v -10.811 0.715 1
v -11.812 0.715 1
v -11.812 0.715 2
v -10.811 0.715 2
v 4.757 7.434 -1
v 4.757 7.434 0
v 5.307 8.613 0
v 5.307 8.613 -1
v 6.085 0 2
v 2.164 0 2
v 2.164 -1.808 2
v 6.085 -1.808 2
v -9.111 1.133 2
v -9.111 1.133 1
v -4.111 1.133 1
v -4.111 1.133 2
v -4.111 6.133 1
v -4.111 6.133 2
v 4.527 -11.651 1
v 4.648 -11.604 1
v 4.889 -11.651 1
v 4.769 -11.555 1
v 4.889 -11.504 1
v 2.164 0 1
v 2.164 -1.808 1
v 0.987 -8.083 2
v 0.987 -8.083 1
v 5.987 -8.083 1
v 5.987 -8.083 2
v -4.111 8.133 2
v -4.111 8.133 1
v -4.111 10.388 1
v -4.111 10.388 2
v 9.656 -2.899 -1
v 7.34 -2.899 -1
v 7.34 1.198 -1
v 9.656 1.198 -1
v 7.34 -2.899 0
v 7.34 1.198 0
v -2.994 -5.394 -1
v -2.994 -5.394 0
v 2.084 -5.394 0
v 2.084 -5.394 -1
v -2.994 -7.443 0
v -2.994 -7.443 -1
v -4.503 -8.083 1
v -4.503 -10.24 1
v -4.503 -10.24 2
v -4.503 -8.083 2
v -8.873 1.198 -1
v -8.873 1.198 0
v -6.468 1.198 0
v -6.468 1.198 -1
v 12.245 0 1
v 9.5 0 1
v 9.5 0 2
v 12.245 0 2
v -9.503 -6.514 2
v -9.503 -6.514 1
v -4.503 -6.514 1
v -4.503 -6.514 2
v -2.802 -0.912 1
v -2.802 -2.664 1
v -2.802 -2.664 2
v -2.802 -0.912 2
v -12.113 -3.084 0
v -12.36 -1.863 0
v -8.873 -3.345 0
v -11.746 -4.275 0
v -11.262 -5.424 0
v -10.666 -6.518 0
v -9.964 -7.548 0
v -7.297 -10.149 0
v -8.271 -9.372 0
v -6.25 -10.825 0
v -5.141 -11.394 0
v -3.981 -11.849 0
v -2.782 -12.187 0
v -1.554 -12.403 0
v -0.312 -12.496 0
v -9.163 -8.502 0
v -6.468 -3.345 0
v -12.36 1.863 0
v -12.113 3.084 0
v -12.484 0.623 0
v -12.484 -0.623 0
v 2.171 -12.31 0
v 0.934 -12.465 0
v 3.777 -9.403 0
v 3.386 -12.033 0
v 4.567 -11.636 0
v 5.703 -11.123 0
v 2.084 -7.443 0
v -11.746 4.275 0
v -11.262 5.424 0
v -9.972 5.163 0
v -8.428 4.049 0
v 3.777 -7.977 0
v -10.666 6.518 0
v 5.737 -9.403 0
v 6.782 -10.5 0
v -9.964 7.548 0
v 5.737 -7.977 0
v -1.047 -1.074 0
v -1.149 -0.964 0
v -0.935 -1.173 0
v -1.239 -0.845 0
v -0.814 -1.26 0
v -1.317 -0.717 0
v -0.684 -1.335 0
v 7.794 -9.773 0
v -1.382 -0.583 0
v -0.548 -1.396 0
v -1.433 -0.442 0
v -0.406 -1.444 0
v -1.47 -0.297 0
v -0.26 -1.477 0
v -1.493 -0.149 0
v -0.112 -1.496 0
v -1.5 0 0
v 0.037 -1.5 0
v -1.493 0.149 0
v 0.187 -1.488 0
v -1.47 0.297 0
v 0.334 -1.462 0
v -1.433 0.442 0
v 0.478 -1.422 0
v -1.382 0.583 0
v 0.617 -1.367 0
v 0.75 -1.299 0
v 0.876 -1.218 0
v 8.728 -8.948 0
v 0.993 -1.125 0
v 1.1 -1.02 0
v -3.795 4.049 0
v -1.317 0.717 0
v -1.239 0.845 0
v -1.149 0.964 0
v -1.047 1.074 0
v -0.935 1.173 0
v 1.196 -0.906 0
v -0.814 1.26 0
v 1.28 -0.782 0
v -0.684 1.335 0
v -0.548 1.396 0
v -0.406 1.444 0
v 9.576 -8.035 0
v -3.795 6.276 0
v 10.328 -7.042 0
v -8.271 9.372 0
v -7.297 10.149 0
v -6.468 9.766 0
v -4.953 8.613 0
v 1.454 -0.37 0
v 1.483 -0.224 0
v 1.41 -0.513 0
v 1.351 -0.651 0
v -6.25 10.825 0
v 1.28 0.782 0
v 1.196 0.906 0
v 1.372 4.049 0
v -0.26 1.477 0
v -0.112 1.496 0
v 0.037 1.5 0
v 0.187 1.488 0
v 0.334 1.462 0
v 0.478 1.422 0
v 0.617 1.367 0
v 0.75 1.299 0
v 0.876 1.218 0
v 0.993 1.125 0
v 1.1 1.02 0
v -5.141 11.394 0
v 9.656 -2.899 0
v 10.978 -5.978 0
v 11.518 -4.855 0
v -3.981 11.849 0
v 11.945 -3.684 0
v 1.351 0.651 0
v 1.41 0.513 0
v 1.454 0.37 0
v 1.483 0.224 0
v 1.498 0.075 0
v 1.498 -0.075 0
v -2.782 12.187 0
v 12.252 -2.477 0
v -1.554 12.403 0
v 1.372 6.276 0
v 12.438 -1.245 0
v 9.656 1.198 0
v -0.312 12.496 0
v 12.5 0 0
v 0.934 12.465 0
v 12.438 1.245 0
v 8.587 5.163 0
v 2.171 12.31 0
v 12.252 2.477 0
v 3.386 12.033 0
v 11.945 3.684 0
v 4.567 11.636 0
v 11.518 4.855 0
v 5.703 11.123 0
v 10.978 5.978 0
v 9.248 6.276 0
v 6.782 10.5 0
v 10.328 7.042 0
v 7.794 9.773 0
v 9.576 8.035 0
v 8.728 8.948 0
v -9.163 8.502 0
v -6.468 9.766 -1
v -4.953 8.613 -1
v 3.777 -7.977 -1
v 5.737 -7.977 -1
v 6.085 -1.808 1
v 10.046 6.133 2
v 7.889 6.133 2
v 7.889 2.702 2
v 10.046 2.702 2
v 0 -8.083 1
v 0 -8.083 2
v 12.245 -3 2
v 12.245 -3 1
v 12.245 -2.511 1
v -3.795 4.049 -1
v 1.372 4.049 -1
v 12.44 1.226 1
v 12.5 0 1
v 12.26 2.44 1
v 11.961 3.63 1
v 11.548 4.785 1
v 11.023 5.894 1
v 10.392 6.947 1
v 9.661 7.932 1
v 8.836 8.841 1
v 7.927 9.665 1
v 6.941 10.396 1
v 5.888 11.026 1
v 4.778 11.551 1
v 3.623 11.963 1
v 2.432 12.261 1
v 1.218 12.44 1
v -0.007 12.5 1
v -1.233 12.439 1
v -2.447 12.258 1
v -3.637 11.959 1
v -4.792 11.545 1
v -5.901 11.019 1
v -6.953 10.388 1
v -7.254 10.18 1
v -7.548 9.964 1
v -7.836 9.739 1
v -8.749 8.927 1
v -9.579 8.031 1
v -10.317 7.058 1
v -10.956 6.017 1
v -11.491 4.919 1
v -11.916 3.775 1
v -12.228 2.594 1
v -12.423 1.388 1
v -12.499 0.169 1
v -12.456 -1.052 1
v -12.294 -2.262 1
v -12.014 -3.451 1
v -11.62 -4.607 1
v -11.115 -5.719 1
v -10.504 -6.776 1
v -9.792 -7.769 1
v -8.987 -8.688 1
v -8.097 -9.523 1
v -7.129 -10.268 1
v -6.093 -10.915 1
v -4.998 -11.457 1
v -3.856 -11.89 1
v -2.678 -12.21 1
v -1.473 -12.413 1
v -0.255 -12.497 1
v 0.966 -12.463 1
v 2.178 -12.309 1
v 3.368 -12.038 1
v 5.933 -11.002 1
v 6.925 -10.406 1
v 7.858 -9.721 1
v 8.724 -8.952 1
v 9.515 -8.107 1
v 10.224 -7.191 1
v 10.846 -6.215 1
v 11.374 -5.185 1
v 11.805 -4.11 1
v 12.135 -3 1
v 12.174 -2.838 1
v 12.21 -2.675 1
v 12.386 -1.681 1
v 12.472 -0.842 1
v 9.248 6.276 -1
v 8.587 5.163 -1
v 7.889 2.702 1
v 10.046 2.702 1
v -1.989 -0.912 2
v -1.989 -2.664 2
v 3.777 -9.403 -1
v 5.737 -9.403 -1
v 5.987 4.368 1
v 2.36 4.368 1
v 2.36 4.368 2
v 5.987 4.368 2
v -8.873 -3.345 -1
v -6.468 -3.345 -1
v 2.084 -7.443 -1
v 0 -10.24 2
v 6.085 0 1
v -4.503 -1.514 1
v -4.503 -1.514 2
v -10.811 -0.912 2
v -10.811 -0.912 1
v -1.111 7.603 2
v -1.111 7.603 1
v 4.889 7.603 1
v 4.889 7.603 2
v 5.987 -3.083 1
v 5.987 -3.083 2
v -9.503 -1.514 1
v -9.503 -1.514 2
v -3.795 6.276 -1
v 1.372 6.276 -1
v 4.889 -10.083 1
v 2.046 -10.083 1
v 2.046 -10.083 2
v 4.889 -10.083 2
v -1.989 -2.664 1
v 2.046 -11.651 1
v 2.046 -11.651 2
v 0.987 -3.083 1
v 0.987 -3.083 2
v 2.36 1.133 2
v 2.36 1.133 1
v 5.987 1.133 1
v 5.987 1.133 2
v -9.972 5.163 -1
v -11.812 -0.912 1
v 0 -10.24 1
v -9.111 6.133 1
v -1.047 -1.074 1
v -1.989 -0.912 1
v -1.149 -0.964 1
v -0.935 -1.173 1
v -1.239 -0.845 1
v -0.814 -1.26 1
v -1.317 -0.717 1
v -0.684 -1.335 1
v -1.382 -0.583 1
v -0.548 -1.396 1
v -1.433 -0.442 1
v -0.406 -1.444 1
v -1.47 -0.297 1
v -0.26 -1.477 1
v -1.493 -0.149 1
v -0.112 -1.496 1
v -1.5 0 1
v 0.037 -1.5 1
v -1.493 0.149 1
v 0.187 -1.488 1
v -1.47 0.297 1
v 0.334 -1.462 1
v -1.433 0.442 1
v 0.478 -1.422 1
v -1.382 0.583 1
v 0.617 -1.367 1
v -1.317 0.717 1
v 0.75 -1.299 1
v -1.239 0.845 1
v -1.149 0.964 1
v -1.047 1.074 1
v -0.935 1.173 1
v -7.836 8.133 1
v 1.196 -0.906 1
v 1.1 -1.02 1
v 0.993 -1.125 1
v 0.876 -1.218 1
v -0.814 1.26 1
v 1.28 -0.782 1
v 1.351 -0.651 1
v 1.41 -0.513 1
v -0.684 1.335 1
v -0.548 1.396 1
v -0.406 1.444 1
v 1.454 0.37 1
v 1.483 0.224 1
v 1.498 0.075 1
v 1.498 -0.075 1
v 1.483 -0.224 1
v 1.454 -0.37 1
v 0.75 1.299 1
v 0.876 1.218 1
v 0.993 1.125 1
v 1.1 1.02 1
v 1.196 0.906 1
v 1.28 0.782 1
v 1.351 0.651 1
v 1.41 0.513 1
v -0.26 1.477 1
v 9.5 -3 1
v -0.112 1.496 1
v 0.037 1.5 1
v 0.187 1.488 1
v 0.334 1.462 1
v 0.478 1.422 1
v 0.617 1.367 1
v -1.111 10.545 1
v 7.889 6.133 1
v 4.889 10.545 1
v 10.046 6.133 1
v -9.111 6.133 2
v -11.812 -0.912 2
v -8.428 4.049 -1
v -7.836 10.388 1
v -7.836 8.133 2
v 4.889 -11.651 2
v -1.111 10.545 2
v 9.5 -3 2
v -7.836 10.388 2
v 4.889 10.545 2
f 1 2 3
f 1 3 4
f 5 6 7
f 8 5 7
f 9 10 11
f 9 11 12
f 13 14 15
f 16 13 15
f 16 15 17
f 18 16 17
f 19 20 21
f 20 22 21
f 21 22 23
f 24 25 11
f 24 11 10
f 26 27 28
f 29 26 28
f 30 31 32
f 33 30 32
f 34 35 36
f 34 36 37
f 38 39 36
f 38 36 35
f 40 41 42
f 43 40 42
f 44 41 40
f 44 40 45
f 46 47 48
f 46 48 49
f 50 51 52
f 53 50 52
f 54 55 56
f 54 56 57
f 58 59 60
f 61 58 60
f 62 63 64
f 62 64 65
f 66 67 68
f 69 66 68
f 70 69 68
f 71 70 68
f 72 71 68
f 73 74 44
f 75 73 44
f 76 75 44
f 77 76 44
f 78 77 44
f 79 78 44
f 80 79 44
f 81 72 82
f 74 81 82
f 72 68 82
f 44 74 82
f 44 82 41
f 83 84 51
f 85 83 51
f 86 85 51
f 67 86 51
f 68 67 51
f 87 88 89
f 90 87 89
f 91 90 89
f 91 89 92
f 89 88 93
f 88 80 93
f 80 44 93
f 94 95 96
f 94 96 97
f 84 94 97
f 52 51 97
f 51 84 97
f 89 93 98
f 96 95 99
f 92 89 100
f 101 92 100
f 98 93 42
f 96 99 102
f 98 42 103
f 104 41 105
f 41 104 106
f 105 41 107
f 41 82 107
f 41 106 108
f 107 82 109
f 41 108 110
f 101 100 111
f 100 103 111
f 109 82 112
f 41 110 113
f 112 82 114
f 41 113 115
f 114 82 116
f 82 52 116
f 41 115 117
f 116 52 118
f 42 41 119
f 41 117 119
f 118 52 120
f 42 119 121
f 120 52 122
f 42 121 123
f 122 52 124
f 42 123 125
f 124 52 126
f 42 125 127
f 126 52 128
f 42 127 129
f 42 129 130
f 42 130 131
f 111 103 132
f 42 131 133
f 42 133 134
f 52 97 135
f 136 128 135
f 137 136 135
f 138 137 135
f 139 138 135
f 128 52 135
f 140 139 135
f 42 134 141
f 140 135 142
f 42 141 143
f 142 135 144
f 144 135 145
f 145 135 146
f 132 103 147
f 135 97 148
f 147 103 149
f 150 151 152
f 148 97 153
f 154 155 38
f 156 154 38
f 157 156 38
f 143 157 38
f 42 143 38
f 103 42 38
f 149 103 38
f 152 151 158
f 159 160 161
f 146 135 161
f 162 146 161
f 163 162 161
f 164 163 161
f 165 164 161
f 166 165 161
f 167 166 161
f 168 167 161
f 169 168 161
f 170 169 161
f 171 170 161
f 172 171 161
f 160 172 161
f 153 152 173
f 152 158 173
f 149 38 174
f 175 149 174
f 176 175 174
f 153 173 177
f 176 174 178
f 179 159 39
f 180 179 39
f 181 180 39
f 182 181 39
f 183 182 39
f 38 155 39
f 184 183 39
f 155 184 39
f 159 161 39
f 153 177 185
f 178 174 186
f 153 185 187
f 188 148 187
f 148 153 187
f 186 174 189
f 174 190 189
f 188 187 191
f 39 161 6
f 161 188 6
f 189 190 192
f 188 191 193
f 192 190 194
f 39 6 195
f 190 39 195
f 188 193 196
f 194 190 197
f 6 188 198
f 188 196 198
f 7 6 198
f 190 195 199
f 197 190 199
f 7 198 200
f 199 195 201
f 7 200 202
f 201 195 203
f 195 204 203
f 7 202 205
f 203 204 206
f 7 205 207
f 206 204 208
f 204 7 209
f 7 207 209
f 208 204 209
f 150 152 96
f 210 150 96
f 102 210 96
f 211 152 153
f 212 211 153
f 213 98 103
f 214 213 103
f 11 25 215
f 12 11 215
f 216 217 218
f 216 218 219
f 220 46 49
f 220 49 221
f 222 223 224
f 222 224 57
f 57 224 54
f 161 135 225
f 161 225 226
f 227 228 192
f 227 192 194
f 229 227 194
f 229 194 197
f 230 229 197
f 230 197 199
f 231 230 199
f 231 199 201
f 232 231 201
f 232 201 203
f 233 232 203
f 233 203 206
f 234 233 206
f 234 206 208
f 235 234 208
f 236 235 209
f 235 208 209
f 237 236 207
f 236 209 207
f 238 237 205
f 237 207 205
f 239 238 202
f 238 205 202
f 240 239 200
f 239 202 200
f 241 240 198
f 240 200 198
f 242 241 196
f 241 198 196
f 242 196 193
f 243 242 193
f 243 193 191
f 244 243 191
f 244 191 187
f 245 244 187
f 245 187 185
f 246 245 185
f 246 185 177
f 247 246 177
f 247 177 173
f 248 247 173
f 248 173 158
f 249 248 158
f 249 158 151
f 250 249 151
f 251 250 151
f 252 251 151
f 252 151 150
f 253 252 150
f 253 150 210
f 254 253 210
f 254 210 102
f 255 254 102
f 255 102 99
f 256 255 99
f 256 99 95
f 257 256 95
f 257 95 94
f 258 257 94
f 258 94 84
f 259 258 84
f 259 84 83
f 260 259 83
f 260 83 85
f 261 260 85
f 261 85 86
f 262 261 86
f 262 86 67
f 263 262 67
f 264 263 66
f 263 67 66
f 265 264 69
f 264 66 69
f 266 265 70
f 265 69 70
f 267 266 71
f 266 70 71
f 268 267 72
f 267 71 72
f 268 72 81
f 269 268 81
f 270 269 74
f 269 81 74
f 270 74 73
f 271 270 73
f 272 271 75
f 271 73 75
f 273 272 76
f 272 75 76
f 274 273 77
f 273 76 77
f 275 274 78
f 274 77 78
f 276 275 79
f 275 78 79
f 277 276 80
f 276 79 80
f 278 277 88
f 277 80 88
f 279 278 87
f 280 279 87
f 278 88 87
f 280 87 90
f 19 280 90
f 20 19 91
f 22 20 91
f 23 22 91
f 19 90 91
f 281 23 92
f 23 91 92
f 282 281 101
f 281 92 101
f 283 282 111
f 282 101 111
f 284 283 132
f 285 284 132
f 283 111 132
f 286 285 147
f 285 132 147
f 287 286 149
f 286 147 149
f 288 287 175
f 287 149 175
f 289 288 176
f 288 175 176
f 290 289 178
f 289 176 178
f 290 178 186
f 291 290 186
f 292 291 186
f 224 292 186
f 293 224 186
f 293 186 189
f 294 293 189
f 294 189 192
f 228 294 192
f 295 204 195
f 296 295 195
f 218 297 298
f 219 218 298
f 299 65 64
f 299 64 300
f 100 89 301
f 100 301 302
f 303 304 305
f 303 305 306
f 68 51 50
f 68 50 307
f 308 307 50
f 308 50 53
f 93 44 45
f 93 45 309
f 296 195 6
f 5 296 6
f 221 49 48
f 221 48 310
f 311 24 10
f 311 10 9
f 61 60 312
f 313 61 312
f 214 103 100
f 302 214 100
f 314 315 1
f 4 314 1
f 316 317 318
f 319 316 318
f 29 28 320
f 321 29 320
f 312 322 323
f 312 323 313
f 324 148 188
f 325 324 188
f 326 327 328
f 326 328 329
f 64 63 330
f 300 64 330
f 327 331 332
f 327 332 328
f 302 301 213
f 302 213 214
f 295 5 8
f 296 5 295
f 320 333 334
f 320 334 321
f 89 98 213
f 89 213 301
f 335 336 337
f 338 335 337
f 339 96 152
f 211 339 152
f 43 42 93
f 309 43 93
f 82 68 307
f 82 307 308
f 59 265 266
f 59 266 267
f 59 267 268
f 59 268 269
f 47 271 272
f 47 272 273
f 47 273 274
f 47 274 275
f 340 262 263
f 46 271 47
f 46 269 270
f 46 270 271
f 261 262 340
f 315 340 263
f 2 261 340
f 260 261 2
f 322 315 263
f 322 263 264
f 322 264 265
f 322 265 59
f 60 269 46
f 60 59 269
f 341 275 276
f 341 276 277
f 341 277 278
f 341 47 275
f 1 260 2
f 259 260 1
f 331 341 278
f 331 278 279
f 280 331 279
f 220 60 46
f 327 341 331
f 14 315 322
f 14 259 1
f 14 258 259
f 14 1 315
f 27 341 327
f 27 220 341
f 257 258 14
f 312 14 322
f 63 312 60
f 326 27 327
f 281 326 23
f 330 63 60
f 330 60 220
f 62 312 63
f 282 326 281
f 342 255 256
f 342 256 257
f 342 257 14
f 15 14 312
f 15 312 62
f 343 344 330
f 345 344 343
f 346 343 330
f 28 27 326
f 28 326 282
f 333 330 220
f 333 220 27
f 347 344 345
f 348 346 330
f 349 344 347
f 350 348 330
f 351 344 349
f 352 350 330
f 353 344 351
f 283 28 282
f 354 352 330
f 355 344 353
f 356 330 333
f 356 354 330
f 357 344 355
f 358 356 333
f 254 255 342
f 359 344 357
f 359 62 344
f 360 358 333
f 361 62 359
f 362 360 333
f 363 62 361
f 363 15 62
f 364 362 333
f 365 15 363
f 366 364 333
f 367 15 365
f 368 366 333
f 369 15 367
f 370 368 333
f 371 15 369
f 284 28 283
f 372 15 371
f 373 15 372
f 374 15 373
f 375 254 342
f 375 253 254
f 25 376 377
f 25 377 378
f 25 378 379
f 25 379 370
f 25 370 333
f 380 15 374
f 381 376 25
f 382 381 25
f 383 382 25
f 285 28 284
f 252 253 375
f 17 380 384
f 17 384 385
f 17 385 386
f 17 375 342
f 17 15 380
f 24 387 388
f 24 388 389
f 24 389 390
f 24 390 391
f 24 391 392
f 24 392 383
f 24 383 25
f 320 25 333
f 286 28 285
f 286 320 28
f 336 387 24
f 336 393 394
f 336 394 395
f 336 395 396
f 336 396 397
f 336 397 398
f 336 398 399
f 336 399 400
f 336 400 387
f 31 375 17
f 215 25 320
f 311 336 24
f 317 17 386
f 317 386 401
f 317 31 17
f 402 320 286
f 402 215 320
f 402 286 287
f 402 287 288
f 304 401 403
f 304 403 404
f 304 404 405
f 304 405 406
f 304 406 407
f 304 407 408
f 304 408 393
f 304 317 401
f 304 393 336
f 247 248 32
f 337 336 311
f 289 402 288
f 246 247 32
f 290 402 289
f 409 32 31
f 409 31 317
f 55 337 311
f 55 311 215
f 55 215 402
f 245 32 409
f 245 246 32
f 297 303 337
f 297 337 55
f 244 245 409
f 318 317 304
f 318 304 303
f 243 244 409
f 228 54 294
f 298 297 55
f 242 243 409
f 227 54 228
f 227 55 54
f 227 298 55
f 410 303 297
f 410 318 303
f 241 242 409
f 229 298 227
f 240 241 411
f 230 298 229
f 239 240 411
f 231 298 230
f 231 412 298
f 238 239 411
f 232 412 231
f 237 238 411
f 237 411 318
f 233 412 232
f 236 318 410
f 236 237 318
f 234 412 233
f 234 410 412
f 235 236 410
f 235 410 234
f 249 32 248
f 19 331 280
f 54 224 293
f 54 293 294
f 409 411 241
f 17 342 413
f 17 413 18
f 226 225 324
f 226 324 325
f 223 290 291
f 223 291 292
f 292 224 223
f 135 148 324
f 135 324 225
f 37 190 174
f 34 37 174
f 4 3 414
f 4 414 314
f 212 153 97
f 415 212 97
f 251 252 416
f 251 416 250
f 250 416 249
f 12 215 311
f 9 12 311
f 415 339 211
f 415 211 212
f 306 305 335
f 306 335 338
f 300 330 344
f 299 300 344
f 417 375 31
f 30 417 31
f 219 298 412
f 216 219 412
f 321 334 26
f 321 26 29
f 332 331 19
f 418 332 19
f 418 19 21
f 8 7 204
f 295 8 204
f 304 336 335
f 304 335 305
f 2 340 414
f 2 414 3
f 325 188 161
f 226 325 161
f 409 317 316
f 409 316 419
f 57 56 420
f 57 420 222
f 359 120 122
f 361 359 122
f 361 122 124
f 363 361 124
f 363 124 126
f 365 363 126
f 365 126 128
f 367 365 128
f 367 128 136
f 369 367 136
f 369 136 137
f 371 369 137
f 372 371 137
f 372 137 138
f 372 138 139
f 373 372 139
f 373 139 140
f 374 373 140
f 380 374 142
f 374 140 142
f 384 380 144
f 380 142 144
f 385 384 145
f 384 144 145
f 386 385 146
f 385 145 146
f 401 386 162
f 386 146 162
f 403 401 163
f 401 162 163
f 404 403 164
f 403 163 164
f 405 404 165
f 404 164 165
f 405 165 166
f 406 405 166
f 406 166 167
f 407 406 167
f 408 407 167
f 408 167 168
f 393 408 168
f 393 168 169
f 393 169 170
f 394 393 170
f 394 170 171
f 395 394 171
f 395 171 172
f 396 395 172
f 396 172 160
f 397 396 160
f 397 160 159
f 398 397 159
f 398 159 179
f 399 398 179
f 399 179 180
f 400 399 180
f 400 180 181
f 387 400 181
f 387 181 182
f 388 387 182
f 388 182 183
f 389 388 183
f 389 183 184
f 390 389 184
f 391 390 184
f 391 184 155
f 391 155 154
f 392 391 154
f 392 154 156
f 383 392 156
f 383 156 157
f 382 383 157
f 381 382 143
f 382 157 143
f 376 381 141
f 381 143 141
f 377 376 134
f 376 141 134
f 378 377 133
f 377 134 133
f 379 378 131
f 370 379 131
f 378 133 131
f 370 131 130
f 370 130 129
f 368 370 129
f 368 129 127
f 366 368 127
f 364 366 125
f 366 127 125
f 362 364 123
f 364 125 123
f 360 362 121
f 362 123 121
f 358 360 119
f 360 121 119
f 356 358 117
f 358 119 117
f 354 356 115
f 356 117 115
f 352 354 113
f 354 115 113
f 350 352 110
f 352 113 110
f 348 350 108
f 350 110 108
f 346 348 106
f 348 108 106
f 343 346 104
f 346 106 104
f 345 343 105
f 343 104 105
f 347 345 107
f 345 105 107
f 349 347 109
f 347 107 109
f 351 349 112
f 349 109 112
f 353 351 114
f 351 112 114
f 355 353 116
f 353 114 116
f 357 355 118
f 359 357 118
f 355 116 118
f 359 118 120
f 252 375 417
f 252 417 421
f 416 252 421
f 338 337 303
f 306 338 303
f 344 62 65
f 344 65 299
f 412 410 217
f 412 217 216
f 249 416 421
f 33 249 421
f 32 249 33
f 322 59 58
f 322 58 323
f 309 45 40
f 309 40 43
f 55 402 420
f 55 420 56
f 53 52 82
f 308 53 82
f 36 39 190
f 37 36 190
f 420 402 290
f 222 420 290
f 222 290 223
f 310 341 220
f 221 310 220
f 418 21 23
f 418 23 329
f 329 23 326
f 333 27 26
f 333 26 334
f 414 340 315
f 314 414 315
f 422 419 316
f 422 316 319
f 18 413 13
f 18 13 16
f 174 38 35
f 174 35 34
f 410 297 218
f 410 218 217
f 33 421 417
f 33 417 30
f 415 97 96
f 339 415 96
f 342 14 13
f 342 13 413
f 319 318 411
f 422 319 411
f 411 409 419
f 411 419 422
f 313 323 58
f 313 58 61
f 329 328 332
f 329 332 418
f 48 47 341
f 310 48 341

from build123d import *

# Parameters (mm, degrees)
F0_R     = 12.5
F1_DEPTH = 1
F2_W     = 5
F2_H     = 5
F2_W_2   = 3.627453
F2_H_2   = 3.235293
F2_W_3   = 6
F2_H_3   = 2.941177
F2_W_4   = 2.745098
F2_H_4   = 3
F2_W_5   = 3.72549
F2_H_5   = 2.254901
F2_W_6   = 4.502999
F2_H_6   = 2.156863
F2_W_7   = 2.843137
F2_H_7   = 1.568628
F2_W_8   = 2.156863
F2_H_8   = 3.431373
F2_W_9   = 3.921569
F2_H_9   = 1.808301
F2_W_10  = 1.00111
F2_H_10  = 1.626806
F2_W_11  = 0.813403
F2_H_11  = 1.751944
F3_DEPTH = 1
F4_W     = 2.405281
F4_H     = 4.543311
F4_W_2   = 5.166902
F4_H_2   = 2.227113
F4_W_3   = 2.316197
F4_H_3   = 4.097889
F4_W_4   = 5.077818
F4_H_4   = 2.048944
F4_W_5   = 1.95986
F4_H_5   = 1.425353
F5_DEPTH = 1
F7_D     = 3


with BuildPart() as f1:
    # F0 (on Top) → F1 (new body)
    with BuildSketch(Plane.XY):
        Circle(F0_R)
    extrude(amount=F1_DEPTH)

    # F2 (on face) → F3 (join)
    with BuildSketch(Plane.XY.offset(1)):
        with Locations((-7.002999, -4.014183)):
            Rectangle(F2_W, F2_H)
        with Locations((3.487197, -5.58281)):
            Rectangle(F2_W, F2_H)
        with Locations((-6.610843, 3.632876)):
            Rectangle(F2_W, F2_H)
        with Locations((4.173471, 2.750522)):
            Rectangle(F2_W_2, F2_H_2)
        with Locations((1.889157, 9.074051)):
            Rectangle(F2_W_3, F2_H_3)
        with Locations((10.872549, -1.5)):
            Rectangle(F2_W_4, F2_H_4)
        with Locations((-5.973588, 9.260326)):
            Rectangle(F2_W_5, F2_H_5)
        with Locations((-2.251499, -9.161241)):
            Rectangle(F2_W_6, F2_H_6)
        with Locations((3.467588, -10.867124)):
            Rectangle(F2_W_7, F2_H_7)
        with Locations((8.967588, 4.417189)):
            Rectangle(F2_W_8, F2_H_8)
        with Locations((4.124451, -0.90415)):
            Rectangle(F2_W_9, F2_H_9)
        with Locations((-11.311609, -0.098308)):
            Rectangle(F2_W_10, F2_H_10)
        with Locations((-2.395462, -1.787683)):
            Rectangle(F2_W_11, F2_H_11)
    extrude(amount=F3_DEPTH)

    # F4 (on face) → F5 (join)
    with BuildSketch(Plane(origin=(0, 0, 0), x_dir=(1, 0, 0), z_dir=(0, 0, -1))):
        with Locations((-7.670486, 1.073175)):
            Rectangle(F4_W, F4_H)
        with Locations((-1.211858, -5.162741)):
            Rectangle(F4_W_2, F4_H_2)
        with Locations((8.498355, 0.850464)):
            Rectangle(F4_W_3, F4_H_3)
        with Locations((-0.45464, 6.418247)):
            Rectangle(F4_W_4, F4_H_4)
        with Locations((4.756806, 8.689903)):
            Rectangle(F4_W_5, F4_H_5)
        Polygon((8.58744, -5.162742), (4.756805, -7.434397), (5.306815, -8.613397), (9.247805, -6.276298), align=None)
        Polygon((-4.953409, -8.613397), (-8.427706, -4.049185), (-9.972012, -5.162742), (-6.467846, -9.766193), align=None)
    extrude(amount=F5_DEPTH)

    # F7 (through all)
    with Locations(Plane.XY.offset(1)):
        with Locations((0, 0)):
            Hole(F7_D / 2)


solid = f1.part
